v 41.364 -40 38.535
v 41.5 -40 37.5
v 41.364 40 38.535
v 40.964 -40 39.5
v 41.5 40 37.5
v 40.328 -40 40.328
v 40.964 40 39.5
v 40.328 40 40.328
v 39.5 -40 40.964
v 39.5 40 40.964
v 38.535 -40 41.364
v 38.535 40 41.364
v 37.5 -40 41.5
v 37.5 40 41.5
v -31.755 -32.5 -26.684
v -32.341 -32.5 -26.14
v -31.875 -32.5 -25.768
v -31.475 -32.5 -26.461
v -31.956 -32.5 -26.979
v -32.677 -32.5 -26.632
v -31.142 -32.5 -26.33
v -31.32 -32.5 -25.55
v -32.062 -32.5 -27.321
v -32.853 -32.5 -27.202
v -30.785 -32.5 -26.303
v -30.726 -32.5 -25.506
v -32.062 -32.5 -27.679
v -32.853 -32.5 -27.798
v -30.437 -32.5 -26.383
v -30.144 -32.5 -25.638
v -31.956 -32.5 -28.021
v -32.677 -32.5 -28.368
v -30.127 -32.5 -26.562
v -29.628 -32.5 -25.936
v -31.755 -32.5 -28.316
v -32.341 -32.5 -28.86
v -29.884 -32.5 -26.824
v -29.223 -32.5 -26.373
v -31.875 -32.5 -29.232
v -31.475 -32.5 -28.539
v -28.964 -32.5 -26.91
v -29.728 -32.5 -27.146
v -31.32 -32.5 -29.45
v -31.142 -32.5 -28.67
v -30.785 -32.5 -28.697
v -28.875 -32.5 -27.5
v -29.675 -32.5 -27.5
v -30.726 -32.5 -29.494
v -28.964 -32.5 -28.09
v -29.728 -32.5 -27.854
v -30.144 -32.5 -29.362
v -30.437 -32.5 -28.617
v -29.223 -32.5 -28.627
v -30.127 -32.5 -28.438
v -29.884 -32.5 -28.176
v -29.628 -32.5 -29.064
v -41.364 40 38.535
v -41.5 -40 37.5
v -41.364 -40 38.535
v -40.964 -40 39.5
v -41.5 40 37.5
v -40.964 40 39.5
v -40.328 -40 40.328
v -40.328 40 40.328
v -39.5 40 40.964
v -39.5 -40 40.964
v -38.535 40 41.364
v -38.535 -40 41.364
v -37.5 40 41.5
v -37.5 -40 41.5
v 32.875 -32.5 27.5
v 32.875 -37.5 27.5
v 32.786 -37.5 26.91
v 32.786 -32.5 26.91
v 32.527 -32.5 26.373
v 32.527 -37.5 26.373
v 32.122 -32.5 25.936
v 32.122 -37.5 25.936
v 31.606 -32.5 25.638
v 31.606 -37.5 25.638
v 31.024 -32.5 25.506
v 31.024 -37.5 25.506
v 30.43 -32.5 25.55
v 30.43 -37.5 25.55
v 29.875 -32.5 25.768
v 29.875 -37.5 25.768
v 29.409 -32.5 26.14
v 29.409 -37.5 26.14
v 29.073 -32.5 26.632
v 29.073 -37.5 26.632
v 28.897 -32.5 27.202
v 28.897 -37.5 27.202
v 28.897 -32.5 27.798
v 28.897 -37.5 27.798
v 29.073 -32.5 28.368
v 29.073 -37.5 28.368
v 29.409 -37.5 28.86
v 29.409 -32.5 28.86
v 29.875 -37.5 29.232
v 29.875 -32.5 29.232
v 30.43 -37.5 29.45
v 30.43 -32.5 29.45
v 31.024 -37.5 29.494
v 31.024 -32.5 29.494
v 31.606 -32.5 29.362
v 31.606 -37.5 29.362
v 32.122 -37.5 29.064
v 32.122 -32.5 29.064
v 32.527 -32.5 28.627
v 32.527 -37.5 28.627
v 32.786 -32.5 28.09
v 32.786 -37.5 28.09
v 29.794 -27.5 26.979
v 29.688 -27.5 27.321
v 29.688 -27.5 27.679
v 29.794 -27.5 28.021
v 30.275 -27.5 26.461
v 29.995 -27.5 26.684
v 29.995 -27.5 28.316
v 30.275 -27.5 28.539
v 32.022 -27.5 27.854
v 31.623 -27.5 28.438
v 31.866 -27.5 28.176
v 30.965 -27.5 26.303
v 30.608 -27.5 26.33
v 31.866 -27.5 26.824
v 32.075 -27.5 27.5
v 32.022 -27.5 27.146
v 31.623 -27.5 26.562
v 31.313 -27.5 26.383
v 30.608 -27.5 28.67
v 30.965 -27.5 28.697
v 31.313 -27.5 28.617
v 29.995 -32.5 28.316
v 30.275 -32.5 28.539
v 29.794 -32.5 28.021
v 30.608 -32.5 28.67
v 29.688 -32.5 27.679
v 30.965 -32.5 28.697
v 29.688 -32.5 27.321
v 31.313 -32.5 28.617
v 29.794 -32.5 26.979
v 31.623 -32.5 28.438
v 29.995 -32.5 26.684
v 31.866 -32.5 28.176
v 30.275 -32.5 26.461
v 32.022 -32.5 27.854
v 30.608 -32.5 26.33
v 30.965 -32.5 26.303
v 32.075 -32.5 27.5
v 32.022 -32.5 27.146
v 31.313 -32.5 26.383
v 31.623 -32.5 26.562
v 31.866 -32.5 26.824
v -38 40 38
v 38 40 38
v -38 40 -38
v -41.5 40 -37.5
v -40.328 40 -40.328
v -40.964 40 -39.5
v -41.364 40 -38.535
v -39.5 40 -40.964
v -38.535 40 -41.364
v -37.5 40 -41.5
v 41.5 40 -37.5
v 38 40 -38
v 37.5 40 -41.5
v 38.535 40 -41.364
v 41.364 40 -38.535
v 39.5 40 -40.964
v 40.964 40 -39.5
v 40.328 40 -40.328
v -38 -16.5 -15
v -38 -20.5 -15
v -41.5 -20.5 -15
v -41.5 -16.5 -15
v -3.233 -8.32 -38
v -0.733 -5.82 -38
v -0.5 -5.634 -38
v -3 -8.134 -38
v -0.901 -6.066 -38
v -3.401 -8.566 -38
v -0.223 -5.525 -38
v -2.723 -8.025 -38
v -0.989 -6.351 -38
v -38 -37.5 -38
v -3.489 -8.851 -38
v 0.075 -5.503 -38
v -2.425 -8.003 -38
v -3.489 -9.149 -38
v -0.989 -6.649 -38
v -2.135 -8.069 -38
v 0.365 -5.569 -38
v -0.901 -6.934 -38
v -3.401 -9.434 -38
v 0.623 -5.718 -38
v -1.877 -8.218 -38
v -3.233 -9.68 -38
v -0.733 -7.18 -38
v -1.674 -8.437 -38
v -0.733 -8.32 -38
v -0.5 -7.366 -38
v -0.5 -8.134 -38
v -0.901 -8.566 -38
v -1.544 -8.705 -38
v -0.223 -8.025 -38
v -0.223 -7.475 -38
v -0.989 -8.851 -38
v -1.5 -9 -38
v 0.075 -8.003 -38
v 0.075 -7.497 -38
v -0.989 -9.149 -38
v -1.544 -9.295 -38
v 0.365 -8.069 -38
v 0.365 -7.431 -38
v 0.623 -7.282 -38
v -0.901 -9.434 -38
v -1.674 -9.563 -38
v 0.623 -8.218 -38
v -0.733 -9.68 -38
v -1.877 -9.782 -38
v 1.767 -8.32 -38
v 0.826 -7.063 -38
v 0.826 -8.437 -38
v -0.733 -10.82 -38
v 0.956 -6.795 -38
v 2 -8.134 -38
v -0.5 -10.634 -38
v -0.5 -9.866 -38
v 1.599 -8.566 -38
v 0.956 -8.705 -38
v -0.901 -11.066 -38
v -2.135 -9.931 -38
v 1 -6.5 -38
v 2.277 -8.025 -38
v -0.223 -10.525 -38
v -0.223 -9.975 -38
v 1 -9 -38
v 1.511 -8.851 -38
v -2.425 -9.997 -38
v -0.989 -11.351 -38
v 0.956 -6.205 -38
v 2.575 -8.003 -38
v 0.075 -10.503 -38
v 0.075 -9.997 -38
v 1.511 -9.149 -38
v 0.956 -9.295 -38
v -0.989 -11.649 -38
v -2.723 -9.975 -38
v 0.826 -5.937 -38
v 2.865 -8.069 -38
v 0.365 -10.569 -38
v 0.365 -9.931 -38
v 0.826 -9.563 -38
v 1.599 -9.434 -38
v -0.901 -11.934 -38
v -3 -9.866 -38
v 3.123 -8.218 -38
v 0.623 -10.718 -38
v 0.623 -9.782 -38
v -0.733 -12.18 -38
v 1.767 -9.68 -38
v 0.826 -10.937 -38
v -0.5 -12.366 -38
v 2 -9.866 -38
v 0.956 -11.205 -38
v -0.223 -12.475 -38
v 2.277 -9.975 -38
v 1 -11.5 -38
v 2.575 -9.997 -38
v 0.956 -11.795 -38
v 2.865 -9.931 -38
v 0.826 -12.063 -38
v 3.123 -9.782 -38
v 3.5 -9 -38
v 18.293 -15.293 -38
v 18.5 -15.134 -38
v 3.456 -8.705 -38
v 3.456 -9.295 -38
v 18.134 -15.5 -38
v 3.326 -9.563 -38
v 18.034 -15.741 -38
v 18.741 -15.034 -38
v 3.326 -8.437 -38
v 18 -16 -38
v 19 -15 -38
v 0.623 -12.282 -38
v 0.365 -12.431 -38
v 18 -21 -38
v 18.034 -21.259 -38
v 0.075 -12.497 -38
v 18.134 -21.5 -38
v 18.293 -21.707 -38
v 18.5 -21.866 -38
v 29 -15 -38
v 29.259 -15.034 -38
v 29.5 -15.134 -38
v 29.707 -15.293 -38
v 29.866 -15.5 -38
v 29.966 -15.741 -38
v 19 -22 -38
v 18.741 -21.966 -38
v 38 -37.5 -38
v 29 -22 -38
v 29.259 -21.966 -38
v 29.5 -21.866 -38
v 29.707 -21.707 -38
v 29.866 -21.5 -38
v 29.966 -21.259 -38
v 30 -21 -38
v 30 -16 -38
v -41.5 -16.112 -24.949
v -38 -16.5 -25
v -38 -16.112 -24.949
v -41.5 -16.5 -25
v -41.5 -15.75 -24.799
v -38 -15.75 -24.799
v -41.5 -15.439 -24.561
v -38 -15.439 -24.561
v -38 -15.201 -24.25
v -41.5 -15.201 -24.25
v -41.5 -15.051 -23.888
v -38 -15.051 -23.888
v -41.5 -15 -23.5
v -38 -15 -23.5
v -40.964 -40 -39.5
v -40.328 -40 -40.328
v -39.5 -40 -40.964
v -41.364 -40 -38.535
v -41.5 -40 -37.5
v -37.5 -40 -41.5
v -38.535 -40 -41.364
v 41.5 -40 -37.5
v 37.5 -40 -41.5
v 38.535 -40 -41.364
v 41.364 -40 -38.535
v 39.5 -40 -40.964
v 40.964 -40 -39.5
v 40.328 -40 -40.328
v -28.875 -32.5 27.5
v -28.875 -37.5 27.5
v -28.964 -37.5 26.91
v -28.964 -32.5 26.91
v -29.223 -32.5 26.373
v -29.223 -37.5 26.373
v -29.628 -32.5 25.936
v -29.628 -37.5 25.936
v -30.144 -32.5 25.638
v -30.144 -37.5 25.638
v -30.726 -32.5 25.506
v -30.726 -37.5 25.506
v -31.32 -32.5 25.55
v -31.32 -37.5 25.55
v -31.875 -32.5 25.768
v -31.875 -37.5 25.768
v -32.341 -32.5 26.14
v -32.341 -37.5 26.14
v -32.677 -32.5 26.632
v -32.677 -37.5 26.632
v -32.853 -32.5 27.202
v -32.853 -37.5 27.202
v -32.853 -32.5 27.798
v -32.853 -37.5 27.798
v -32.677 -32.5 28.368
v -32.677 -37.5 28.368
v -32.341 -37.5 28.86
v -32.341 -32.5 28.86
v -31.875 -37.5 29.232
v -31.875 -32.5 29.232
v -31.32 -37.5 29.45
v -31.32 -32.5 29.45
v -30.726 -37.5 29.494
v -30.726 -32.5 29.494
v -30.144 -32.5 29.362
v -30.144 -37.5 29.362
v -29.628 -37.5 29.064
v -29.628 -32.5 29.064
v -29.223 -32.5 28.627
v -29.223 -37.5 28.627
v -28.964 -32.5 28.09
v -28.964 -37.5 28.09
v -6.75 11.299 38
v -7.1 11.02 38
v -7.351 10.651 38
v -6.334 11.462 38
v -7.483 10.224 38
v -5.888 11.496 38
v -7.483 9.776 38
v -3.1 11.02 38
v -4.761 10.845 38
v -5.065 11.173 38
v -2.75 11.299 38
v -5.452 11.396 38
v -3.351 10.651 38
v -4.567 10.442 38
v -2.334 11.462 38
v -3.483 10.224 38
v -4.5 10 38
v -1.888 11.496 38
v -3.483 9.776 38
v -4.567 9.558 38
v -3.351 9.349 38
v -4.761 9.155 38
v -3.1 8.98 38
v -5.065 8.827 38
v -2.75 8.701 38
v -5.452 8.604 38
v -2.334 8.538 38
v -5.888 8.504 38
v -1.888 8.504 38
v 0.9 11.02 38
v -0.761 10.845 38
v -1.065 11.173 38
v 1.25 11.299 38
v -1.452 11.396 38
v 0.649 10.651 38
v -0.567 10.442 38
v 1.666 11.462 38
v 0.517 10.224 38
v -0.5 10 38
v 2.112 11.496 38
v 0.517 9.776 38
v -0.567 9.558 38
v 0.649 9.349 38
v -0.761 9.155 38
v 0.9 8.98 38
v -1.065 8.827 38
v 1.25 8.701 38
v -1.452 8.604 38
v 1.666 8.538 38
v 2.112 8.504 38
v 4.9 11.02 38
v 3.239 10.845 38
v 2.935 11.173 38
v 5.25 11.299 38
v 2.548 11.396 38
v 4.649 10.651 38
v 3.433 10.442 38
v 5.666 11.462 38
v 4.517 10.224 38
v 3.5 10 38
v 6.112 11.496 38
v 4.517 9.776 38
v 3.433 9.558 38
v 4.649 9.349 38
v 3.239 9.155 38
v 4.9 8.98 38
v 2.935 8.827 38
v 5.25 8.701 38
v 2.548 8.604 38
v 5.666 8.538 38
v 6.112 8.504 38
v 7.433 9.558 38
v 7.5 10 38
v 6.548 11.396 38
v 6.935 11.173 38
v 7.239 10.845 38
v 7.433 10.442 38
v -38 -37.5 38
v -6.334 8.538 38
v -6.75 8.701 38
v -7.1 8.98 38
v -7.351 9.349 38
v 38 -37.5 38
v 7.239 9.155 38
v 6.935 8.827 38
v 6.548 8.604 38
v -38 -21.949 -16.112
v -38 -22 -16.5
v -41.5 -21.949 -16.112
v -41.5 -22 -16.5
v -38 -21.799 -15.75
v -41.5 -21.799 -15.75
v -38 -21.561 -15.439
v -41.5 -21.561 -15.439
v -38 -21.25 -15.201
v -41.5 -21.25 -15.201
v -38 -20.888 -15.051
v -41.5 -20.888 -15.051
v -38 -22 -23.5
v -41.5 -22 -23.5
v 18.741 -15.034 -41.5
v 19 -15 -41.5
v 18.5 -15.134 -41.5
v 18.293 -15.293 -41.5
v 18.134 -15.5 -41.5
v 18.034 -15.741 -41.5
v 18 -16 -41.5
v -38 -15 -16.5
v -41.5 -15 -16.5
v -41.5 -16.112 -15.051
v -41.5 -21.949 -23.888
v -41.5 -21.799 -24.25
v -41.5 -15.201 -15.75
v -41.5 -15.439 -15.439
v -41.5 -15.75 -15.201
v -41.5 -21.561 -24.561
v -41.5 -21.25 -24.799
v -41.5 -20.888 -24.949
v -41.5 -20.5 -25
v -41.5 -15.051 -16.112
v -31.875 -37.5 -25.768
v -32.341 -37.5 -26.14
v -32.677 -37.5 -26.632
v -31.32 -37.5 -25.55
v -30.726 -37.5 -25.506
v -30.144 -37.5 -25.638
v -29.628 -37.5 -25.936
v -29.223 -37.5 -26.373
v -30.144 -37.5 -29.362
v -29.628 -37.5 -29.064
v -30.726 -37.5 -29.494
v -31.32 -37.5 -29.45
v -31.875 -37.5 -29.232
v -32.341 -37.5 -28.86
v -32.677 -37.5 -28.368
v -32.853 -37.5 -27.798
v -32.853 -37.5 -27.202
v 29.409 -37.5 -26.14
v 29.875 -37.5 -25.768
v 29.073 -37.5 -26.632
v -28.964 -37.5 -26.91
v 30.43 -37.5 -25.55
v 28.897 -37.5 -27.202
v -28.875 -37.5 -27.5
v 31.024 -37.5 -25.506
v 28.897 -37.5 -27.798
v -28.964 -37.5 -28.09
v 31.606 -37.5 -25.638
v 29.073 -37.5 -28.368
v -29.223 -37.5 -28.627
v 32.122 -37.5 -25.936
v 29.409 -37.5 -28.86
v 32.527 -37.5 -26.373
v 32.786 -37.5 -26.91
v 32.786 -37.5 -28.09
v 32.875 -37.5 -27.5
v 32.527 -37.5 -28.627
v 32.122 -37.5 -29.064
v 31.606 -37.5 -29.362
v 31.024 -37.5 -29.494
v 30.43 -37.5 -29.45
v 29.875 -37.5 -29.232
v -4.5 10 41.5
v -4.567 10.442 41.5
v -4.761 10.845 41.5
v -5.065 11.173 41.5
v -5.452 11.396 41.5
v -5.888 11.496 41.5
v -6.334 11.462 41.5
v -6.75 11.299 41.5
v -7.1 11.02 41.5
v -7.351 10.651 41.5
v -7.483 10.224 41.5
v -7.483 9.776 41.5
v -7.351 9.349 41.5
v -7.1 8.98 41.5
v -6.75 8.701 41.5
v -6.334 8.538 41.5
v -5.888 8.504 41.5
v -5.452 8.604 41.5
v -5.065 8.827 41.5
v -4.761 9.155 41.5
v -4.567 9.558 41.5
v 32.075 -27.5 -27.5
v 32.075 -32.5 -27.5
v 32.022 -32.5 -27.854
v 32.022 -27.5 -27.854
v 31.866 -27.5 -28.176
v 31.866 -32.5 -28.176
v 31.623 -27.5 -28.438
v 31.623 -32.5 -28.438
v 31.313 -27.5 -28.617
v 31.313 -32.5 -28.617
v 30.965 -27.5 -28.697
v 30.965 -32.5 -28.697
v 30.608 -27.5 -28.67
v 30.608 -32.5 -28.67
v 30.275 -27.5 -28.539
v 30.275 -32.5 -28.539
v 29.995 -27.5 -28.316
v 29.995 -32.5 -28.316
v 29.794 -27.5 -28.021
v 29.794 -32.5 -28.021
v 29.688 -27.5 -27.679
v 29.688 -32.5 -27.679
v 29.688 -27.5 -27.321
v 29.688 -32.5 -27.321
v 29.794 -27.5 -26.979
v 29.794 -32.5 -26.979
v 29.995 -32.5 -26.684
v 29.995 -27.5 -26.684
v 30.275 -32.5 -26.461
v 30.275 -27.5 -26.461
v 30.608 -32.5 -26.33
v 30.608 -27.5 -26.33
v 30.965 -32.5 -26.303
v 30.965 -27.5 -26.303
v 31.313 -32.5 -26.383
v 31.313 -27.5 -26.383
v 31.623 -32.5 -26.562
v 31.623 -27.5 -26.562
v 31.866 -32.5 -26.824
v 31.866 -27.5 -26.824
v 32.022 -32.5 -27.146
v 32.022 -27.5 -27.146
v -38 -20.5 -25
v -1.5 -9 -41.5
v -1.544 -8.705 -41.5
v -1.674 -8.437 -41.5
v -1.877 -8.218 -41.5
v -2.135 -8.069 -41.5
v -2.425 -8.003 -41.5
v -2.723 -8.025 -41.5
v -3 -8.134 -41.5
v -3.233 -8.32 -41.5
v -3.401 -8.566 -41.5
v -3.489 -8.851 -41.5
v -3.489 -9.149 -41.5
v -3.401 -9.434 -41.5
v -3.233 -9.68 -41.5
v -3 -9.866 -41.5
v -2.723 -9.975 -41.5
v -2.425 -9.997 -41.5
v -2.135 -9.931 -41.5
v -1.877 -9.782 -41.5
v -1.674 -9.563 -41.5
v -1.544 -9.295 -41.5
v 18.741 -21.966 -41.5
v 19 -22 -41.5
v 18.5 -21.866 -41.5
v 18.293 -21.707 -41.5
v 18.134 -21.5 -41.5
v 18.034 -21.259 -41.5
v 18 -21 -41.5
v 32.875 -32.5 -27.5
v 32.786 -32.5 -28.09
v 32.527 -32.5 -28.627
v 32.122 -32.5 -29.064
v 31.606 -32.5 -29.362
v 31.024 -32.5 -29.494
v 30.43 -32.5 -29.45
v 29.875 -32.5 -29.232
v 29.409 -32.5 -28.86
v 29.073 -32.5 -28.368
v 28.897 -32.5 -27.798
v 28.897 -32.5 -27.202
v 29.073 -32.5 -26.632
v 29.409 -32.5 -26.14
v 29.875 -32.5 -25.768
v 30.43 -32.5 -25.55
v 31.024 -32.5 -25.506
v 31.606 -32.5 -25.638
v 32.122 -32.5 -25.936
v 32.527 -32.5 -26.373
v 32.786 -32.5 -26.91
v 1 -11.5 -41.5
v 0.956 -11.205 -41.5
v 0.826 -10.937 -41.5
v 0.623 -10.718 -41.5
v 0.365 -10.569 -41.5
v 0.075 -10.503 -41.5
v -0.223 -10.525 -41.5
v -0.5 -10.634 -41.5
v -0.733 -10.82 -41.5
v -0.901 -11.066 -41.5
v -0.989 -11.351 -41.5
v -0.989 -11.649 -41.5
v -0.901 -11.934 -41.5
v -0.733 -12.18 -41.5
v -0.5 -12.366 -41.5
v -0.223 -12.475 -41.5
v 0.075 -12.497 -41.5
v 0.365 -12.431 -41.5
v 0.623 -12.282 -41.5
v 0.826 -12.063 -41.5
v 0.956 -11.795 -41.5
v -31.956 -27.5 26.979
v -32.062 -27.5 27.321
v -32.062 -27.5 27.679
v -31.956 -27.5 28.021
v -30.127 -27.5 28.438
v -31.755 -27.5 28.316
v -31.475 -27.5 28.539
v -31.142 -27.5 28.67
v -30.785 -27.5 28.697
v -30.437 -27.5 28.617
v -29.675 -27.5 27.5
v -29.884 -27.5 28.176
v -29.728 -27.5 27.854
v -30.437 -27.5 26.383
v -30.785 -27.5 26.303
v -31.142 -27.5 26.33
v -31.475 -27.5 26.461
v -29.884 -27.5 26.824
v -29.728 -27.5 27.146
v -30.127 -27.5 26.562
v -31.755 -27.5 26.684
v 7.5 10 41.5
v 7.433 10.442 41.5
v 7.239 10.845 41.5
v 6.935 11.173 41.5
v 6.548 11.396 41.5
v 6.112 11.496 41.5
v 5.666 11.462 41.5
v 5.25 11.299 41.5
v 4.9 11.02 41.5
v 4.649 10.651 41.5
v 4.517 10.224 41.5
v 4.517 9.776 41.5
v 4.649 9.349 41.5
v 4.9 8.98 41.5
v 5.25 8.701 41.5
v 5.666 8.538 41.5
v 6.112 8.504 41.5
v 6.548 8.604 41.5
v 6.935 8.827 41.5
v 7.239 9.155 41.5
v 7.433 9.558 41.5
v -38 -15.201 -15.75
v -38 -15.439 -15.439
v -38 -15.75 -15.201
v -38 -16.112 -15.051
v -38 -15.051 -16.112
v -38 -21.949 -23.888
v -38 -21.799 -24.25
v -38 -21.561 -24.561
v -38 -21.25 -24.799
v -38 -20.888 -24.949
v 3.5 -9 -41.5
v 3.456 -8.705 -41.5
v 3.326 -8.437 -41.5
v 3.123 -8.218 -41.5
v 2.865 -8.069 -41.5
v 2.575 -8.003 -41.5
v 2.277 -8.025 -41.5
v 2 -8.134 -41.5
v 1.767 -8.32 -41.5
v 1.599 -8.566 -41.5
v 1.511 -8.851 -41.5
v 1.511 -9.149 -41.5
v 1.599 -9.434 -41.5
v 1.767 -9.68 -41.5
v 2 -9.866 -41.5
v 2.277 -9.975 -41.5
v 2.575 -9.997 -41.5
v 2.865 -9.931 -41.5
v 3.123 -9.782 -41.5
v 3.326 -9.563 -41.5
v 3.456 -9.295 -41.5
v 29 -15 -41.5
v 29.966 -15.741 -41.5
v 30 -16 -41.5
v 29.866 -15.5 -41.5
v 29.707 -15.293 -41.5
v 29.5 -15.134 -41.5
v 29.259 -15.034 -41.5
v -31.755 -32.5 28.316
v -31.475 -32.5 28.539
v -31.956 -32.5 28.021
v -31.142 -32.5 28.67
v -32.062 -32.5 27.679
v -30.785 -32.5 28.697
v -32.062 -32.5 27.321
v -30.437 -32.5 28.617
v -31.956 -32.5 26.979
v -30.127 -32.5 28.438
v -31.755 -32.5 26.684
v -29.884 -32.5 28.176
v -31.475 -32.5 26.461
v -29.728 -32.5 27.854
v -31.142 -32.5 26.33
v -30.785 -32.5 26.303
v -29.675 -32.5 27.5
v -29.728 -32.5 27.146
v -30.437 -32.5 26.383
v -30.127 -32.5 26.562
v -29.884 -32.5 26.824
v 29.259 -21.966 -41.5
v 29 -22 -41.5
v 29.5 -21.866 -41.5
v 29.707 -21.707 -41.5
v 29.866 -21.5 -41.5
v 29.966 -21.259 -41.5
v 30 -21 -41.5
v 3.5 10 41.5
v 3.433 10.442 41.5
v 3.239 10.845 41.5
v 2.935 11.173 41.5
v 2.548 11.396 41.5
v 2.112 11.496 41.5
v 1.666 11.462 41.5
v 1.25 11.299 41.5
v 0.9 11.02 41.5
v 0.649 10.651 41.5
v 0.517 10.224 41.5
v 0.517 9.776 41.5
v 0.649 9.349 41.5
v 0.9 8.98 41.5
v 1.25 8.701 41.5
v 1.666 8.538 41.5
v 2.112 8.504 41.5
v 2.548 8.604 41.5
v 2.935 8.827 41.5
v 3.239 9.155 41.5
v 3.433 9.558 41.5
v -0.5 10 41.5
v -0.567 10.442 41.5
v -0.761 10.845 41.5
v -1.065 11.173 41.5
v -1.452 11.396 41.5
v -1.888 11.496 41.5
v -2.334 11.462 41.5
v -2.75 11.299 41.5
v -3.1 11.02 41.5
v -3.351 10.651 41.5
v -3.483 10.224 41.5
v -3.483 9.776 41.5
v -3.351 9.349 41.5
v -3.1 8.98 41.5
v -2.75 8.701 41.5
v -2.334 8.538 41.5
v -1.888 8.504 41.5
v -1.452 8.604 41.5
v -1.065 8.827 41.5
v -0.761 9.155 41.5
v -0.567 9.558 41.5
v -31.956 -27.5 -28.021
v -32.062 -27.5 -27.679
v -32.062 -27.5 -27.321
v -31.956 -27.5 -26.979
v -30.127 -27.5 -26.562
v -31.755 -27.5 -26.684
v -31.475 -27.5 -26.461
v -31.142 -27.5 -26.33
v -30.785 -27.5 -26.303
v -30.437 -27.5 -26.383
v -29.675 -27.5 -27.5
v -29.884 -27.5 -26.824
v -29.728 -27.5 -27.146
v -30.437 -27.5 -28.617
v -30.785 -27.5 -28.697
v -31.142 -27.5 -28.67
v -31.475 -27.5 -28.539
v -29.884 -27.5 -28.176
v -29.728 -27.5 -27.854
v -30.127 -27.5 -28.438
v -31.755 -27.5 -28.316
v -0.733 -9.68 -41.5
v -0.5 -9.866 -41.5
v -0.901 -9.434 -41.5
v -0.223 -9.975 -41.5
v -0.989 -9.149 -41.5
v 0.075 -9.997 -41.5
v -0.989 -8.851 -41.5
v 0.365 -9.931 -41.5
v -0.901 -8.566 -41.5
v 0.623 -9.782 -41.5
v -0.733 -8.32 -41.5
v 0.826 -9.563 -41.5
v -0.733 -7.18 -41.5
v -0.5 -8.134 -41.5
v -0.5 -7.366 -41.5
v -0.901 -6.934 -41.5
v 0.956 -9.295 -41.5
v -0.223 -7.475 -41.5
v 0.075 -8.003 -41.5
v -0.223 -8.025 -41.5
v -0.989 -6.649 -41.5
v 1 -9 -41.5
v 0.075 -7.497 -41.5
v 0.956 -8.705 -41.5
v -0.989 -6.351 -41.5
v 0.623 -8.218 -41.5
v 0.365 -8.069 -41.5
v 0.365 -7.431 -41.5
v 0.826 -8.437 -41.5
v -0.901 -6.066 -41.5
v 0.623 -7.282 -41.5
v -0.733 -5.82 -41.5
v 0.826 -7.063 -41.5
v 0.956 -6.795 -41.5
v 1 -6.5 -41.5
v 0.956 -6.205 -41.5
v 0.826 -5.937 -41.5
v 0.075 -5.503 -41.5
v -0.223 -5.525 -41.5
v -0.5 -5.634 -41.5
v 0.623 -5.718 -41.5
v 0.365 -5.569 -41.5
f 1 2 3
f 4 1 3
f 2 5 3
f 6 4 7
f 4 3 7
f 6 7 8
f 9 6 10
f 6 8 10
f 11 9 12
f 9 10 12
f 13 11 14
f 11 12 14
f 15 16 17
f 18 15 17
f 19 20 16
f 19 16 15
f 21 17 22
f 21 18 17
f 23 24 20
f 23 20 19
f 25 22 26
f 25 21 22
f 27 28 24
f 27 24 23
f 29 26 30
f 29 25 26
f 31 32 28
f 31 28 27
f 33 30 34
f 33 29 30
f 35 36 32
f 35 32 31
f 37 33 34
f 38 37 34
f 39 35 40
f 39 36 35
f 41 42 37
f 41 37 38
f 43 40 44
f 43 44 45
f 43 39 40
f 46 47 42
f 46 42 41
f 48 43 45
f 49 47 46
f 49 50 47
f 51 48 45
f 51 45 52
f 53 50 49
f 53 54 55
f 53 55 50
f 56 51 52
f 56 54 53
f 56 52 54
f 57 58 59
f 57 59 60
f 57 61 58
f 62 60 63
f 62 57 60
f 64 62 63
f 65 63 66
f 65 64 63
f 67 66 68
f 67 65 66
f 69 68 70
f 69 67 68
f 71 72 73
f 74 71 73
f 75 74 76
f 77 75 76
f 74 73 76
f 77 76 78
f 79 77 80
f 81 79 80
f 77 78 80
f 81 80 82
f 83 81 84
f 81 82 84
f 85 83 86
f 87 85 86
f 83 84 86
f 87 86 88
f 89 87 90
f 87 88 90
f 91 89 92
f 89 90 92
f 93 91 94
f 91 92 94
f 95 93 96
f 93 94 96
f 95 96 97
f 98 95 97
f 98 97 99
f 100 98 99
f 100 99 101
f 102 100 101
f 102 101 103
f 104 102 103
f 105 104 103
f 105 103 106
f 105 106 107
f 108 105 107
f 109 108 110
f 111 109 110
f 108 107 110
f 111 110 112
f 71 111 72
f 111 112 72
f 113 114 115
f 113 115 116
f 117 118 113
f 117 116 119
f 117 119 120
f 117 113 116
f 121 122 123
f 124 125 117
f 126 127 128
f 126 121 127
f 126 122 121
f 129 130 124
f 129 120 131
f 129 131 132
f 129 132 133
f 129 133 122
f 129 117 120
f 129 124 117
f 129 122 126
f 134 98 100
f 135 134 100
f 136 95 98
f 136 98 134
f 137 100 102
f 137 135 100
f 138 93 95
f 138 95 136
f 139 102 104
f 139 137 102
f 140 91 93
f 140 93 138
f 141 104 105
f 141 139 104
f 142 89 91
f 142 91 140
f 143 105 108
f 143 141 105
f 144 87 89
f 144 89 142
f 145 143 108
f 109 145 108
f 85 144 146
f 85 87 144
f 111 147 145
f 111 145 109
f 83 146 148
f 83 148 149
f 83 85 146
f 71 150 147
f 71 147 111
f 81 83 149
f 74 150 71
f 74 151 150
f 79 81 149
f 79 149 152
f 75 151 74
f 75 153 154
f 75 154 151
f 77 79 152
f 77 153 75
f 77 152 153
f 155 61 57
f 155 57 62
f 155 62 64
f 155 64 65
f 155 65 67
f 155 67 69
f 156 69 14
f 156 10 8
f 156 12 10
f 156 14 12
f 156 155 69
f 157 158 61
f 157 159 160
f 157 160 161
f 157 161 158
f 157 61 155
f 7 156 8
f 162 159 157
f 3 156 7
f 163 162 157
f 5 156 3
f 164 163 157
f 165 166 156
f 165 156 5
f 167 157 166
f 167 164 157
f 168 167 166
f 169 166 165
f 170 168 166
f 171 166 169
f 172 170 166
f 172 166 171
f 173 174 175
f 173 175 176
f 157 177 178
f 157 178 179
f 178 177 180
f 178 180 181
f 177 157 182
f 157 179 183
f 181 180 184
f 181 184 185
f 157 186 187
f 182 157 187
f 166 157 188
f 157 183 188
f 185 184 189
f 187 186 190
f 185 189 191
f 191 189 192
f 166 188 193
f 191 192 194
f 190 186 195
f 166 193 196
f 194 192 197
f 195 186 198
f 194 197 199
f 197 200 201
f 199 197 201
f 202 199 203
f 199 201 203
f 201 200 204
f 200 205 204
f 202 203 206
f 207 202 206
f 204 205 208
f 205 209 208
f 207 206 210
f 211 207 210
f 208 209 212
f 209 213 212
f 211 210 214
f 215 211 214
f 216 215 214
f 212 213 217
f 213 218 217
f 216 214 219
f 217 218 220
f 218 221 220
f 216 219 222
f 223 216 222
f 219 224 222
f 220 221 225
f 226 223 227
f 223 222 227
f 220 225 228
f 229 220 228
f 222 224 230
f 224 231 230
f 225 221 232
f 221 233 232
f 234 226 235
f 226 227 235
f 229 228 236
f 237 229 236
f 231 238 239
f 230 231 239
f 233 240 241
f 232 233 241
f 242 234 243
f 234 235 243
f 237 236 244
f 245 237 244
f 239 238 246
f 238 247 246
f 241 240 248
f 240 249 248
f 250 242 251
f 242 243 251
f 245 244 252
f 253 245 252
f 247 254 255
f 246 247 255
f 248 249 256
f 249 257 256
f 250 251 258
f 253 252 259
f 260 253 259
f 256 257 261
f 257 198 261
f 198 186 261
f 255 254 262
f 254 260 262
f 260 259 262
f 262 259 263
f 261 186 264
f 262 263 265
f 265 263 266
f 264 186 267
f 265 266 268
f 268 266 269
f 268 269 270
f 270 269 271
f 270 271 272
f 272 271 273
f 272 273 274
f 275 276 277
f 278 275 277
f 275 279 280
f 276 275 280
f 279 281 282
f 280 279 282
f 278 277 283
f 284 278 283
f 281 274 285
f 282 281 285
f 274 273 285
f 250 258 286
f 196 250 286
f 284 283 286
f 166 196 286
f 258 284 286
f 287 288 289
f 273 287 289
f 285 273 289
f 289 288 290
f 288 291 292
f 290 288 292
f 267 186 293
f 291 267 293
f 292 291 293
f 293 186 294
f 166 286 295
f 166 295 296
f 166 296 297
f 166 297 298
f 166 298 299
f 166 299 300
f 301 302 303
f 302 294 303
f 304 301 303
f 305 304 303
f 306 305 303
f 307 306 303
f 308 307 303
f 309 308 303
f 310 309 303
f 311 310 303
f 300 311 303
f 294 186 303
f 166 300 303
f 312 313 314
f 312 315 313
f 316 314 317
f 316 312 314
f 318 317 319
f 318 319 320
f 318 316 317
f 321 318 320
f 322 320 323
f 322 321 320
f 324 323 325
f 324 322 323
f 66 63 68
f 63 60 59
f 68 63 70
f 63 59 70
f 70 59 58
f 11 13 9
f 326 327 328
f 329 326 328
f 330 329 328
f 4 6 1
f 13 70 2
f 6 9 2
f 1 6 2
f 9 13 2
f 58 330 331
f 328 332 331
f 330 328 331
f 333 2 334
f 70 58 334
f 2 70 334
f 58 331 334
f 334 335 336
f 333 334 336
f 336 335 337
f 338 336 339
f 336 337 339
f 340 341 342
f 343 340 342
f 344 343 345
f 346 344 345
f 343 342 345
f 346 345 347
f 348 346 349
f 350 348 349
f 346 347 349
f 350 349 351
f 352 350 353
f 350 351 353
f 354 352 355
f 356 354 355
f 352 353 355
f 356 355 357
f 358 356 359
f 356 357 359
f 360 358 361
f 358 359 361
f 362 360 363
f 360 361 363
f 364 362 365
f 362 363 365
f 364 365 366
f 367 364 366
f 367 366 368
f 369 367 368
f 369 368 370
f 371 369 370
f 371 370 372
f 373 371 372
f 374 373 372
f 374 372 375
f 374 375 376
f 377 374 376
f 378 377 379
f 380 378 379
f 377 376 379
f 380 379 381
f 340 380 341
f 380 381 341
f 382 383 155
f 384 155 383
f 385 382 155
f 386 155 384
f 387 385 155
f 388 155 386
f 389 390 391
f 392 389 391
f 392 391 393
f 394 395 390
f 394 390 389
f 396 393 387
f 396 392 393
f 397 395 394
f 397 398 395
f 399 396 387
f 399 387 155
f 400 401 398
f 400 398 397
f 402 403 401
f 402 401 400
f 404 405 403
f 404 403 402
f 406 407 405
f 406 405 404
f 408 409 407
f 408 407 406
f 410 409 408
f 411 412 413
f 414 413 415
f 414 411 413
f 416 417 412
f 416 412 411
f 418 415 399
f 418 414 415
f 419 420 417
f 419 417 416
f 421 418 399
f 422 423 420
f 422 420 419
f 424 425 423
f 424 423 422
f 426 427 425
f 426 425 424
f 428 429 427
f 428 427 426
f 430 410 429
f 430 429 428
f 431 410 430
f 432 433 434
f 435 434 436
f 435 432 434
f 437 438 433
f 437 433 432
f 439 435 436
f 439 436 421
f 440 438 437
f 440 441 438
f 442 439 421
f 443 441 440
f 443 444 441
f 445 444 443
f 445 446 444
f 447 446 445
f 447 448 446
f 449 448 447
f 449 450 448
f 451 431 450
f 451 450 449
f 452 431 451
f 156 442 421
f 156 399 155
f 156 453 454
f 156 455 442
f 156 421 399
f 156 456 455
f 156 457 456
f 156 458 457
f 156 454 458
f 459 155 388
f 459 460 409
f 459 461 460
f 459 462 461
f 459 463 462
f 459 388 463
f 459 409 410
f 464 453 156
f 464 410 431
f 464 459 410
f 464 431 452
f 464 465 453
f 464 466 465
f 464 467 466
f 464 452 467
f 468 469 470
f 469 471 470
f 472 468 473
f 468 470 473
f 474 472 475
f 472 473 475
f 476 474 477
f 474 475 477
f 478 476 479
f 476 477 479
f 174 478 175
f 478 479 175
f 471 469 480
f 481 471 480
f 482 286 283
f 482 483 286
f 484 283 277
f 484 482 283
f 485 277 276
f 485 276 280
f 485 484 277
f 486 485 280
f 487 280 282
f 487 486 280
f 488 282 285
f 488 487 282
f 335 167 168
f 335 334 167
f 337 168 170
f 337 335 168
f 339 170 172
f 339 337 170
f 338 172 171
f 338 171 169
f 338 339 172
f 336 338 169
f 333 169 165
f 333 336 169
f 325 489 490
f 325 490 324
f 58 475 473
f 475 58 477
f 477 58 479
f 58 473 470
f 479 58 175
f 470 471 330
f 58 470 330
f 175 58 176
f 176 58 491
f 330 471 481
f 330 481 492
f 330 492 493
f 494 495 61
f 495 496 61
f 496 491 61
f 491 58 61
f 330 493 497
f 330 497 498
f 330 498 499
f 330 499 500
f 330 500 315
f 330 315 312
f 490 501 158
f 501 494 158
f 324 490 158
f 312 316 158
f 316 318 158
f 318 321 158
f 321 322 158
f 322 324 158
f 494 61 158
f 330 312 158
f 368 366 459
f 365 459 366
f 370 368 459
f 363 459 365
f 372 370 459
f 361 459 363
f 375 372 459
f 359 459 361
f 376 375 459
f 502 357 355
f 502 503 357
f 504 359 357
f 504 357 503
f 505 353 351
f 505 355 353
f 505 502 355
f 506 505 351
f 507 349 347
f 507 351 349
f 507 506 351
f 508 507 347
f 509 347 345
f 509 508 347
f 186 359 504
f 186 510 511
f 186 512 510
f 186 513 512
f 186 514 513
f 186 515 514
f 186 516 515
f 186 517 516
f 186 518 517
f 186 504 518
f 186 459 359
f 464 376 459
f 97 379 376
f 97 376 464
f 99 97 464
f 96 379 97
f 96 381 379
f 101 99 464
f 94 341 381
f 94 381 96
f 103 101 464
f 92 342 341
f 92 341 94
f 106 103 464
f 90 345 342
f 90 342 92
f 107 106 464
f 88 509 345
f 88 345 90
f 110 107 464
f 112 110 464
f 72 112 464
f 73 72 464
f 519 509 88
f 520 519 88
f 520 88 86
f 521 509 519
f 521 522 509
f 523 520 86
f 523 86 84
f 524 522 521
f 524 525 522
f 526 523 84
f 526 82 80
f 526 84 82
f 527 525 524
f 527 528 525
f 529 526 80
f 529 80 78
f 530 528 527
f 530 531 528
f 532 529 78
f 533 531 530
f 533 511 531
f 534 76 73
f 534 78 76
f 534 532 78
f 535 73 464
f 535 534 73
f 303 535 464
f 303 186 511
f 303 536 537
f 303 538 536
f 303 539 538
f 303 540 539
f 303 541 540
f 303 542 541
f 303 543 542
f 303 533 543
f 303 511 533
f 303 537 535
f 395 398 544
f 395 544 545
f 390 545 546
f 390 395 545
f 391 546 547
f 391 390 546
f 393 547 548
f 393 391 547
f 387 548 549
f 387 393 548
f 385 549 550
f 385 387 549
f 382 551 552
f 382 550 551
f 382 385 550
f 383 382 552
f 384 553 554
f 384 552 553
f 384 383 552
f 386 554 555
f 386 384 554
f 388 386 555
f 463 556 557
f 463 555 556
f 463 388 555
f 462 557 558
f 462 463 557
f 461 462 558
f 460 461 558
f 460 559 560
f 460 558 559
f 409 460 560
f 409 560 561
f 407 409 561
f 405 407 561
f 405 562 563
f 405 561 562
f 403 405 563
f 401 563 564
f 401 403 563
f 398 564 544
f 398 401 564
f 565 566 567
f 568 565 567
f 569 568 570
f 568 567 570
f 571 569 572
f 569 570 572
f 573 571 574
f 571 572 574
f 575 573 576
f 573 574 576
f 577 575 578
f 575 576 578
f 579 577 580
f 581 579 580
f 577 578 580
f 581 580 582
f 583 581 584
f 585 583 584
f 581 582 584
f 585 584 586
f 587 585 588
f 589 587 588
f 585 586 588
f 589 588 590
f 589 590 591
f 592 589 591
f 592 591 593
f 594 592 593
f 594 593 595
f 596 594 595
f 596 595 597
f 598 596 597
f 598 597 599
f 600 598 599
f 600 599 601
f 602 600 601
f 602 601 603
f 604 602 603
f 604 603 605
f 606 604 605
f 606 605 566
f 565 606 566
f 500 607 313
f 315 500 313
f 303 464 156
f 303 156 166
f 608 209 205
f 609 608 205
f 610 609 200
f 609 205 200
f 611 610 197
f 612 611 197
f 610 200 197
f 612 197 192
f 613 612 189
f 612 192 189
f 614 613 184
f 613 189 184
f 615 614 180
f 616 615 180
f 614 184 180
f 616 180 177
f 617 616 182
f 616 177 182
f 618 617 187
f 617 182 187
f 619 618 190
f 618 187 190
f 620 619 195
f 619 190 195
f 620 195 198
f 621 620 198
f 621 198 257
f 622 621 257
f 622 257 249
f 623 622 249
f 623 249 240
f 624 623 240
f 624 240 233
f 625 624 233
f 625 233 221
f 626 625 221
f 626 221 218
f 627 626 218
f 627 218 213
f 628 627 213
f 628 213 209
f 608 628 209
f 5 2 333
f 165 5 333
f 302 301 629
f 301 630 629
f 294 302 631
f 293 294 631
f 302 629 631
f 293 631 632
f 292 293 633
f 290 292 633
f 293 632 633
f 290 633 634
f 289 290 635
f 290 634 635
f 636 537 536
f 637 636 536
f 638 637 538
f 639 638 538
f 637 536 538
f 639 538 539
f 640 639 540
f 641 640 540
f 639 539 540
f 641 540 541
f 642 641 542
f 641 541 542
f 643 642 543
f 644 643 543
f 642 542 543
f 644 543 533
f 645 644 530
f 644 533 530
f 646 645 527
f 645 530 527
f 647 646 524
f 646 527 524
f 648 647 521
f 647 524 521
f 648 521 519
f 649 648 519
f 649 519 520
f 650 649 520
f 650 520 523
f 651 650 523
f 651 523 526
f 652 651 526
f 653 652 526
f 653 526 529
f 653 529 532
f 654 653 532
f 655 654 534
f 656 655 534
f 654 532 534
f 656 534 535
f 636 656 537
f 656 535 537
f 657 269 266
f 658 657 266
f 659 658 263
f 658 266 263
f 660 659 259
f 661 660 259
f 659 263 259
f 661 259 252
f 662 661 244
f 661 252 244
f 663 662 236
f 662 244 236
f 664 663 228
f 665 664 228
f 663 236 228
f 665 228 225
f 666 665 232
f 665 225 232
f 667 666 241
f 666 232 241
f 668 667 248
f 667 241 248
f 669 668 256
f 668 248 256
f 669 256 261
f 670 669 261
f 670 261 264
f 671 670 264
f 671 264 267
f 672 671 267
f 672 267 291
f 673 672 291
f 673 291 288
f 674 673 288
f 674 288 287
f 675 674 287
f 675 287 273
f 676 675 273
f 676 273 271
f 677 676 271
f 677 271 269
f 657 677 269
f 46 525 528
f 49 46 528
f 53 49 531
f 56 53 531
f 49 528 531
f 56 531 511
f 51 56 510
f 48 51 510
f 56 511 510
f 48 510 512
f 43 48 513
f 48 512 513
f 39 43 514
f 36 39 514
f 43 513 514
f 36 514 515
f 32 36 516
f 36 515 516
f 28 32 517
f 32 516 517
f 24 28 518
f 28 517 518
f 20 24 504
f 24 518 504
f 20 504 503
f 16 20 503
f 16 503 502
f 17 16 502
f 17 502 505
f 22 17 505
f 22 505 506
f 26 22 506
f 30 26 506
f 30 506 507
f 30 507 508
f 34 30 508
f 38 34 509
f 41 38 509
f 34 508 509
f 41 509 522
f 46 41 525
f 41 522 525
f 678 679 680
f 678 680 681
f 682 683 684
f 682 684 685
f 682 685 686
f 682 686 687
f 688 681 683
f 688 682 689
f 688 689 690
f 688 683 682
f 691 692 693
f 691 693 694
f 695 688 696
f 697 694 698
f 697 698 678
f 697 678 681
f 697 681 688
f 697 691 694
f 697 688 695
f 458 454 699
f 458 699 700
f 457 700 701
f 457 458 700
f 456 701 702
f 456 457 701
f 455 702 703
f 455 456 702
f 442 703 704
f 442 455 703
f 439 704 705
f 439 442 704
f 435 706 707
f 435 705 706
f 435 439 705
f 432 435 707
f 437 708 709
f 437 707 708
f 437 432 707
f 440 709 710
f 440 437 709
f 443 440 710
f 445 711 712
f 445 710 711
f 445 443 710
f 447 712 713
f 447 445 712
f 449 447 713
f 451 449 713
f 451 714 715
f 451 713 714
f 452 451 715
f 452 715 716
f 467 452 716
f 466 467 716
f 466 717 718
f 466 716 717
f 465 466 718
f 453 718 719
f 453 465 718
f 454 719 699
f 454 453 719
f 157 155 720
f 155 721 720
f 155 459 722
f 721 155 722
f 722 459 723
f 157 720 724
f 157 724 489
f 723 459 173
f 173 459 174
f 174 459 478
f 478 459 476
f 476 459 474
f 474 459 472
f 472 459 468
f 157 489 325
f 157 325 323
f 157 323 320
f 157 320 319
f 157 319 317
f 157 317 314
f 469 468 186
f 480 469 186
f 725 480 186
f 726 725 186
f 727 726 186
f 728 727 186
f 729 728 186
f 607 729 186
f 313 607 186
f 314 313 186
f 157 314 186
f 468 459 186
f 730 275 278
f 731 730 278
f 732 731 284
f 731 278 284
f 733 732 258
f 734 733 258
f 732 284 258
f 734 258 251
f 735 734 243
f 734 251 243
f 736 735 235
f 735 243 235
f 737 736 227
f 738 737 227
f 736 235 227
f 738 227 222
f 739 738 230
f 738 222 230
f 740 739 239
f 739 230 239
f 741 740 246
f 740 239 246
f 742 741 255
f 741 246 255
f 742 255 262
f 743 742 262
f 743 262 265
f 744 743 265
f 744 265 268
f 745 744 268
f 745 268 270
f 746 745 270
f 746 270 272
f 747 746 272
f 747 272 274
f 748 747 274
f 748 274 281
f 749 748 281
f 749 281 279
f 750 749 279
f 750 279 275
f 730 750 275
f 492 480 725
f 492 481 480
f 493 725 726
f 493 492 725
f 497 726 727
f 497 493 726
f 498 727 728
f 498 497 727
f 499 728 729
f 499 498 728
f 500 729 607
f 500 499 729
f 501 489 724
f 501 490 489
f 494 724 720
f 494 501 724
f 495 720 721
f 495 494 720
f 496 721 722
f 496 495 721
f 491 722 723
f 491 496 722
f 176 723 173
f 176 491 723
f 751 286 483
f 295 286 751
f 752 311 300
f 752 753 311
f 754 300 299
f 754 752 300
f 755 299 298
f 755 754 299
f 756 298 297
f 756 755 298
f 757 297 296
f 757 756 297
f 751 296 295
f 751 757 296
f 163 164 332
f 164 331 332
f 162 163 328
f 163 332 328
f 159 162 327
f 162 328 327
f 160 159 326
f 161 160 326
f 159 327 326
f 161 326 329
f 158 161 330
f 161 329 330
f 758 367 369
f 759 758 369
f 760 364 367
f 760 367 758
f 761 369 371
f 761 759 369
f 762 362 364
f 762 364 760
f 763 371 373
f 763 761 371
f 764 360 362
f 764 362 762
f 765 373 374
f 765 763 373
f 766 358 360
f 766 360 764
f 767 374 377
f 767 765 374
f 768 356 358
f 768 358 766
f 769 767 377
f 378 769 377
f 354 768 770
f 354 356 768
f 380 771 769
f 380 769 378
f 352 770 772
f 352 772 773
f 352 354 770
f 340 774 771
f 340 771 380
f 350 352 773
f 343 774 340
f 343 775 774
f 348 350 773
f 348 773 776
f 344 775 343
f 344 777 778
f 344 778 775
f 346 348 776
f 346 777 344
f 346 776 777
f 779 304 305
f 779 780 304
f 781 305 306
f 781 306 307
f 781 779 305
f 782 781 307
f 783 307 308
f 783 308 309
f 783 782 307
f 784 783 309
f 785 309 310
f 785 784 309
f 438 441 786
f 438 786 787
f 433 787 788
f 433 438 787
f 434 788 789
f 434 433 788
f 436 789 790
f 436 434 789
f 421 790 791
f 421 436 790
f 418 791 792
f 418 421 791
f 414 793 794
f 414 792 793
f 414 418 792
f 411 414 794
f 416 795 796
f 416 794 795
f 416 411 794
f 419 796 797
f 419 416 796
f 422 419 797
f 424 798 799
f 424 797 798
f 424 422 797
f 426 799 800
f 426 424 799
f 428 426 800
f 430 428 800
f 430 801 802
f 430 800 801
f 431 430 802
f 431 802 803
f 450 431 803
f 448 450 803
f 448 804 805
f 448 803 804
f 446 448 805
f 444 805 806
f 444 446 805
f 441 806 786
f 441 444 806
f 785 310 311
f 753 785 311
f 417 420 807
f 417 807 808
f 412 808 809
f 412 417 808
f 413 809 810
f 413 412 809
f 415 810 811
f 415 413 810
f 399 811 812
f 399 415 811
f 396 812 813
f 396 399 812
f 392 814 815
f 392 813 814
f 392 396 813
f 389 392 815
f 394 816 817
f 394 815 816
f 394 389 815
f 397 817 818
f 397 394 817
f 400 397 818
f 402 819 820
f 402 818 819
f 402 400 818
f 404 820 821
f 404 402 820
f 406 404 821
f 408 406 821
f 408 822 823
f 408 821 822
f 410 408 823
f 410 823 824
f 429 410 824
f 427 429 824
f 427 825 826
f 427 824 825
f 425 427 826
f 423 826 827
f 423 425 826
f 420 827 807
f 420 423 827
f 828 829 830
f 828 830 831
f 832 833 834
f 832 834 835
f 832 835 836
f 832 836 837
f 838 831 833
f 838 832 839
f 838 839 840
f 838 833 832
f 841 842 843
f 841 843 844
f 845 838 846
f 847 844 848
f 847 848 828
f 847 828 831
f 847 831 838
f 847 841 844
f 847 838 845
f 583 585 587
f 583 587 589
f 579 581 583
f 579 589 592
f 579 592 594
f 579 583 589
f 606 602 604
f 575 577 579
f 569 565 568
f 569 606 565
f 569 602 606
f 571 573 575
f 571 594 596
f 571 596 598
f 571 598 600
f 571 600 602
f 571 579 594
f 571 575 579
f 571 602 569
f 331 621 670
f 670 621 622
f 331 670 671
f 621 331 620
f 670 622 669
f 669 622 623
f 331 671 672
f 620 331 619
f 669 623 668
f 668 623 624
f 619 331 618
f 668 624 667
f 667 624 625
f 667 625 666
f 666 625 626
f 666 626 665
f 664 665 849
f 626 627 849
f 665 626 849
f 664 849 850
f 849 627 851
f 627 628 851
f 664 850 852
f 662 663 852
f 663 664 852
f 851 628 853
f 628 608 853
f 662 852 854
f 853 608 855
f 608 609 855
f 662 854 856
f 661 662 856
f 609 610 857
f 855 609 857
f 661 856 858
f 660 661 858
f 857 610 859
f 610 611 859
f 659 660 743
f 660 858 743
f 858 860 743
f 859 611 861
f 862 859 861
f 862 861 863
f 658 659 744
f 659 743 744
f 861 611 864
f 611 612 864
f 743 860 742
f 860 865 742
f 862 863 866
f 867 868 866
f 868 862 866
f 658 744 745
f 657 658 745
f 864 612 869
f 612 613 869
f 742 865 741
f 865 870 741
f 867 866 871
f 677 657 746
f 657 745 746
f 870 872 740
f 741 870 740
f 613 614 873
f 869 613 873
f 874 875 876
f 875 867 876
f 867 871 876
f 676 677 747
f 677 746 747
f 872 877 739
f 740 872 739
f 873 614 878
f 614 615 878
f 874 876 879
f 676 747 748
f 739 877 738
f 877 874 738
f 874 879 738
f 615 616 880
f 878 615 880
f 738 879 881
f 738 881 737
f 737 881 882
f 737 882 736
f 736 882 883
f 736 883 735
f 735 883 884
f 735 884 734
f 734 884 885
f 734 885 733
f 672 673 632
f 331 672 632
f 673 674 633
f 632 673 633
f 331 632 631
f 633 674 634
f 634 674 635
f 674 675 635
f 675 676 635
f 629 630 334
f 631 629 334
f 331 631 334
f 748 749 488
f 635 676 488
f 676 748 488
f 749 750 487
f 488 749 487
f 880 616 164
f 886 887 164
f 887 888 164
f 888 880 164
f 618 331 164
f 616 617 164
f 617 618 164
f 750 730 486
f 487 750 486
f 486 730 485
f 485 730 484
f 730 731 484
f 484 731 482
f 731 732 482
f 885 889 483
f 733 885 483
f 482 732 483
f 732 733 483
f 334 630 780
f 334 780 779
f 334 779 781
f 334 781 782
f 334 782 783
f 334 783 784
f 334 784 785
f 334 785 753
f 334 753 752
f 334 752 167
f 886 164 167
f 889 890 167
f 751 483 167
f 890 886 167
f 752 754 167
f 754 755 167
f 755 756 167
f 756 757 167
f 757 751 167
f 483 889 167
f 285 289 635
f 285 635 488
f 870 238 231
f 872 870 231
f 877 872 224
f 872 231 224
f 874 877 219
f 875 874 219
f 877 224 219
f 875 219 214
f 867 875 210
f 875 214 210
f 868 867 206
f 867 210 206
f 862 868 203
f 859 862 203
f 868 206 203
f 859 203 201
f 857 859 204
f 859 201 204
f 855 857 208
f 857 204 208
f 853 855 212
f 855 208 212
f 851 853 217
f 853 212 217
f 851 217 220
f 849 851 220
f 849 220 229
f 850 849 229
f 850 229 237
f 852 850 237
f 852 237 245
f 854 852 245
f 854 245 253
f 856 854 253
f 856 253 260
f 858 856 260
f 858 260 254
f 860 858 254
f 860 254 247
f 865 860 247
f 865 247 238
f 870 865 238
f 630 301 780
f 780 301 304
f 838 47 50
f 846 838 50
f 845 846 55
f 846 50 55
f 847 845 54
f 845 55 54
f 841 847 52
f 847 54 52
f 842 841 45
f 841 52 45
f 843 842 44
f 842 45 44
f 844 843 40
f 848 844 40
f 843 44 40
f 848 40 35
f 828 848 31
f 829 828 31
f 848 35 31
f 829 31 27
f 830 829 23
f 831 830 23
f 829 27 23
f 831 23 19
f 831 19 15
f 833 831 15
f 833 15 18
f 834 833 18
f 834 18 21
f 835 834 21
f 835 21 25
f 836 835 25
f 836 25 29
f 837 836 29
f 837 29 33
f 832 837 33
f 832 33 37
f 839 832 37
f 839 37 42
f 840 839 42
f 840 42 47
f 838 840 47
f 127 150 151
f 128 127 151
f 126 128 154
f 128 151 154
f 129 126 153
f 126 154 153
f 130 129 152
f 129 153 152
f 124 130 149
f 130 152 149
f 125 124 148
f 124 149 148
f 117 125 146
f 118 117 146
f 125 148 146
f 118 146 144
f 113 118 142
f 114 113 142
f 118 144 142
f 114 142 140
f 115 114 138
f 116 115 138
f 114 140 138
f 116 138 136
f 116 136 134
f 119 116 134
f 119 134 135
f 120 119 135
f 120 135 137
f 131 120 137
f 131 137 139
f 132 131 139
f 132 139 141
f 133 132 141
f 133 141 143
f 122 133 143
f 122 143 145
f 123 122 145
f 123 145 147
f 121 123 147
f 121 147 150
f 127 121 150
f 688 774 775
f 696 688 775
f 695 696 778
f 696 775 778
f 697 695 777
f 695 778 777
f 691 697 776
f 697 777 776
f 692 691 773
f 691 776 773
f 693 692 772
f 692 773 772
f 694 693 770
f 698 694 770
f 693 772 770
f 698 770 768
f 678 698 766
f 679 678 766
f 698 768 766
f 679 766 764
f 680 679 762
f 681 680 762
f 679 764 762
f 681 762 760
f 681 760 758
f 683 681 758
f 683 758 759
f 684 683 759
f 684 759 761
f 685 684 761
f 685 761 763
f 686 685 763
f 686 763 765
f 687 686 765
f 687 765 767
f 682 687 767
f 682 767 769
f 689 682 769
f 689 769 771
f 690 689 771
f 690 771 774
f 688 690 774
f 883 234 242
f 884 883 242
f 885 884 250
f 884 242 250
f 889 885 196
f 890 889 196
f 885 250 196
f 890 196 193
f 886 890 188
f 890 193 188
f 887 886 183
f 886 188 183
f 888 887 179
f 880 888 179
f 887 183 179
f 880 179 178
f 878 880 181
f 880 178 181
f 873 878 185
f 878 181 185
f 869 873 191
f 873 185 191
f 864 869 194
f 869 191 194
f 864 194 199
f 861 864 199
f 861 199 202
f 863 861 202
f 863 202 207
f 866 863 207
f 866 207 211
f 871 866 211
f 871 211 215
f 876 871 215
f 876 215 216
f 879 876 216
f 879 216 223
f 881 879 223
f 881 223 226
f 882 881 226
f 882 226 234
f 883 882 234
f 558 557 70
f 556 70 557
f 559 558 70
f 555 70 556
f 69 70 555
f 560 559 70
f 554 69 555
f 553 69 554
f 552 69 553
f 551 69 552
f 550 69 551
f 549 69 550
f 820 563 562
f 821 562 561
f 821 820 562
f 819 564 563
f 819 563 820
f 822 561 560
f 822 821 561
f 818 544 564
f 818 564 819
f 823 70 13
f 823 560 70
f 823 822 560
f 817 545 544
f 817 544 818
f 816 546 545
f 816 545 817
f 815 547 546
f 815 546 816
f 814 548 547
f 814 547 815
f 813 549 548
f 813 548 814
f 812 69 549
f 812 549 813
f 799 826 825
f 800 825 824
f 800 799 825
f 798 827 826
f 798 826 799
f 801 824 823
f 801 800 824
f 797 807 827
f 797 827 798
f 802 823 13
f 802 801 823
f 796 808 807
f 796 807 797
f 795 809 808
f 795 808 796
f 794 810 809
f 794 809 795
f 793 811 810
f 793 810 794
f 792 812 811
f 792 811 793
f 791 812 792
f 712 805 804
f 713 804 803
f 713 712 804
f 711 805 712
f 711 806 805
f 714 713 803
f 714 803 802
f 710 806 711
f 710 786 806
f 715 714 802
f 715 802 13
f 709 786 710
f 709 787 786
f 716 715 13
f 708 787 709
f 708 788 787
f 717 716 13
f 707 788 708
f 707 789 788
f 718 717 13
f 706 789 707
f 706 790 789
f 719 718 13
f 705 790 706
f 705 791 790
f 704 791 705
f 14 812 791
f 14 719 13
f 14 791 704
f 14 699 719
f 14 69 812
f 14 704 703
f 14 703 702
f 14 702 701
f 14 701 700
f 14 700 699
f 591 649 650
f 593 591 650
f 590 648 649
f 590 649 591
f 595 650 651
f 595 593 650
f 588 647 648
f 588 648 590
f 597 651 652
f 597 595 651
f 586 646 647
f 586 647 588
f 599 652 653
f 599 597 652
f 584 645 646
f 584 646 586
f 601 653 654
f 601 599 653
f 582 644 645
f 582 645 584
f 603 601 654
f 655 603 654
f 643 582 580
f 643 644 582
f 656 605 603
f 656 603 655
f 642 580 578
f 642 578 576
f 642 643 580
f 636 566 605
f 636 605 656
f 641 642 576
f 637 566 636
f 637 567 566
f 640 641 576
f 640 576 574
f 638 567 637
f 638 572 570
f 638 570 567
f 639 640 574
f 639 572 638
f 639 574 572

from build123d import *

# Parameters (mm, degrees)
BOSS_EXTRUDE2_DEPTH      = 40
BOSS_EXTRUDE2_DEPTH_BACK = 40
SKETCH4_W                = 83
SKETCH4_H                = 83
CUT_EXTRUDE1_DEPTH       = 50
CUT_EXTRUDE1_DEPTH_BACK  = 37.5
SKETCH5_W                = 76
SKETCH5_H                = 76
CUT_EXTRUDE2_DEPTH       = 74.5
CUT_EXTRUDE2_DEPTH_BACK  = 5
SKETCH6_R                = 1.5
SKETCH8_R                = 1
CUT_EXTRUDE3_DEPTH       = 70.5
SKETCH9_W                = 12
SKETCH9_H                = 7
CUT_EXTRUDE4_DEPTH       = 108.5
FILLET2_R                = 1
FILLET3_R                = 4
SKETCH10_W               = 10
SKETCH10_H               = 7
CUT_EXTRUDE5_DEPTH       = 83
FILLET4_R                = 1.5
SKETCH11_R               = 2
BOSS_EXTRUDE4_DEPTH      = 5
SKETCH12_R               = 1.2
BOSS_EXTRUDE5_DEPTH      = 10


with BuildPart() as part:
    # Sketch4 → Boss-Extrude2 (new, two sides: drawn at the far end of the back side and taken through both)
    with BuildSketch(Plane(origin=(0, 0, 0), x_dir=(1, 0, 0), z_dir=(0, 1, 0)).offset(-BOSS_EXTRUDE2_DEPTH_BACK)):
        Rectangle(SKETCH4_W, SKETCH4_H)
    extrude(amount=BOSS_EXTRUDE2_DEPTH + BOSS_EXTRUDE2_DEPTH_BACK)

    # Sketch5 → Cut-Extrude1 (cut, two sides: drawn at the far end of the back side and taken through both)
    with BuildSketch(Plane(origin=(0, 0, 0), x_dir=(1, 0, 0), z_dir=(0, 1, 0)).offset(-CUT_EXTRUDE1_DEPTH_BACK)):
        Rectangle(SKETCH5_W, SKETCH5_H)
    extrude(amount=CUT_EXTRUDE1_DEPTH + CUT_EXTRUDE1_DEPTH_BACK, mode=Mode.SUBTRACT)

    # Sketch6 → Cut-Extrude2 (cut, two sides: drawn at the far end of the back side and taken through both)
    with BuildSketch(Plane.XY.offset(-CUT_EXTRUDE2_DEPTH_BACK)):
        with Locations((2, 10)):
            Circle(SKETCH6_R)
        with Locations((6, 10)):
            Circle(SKETCH6_R)
        with Locations((-2, 10)):
            Circle(SKETCH6_R)
        with Locations((-6, 10)):
            Circle(SKETCH6_R)
    extrude(amount=CUT_EXTRUDE2_DEPTH + CUT_EXTRUDE2_DEPTH_BACK, mode=Mode.SUBTRACT)

    # Sketch8 → Cut-Extrude3 (cut)
    with BuildSketch(Plane.XY):
        with Locations((0, -9)):
            Circle(SKETCH8_R)
        with Locations((2.5, -9)):
            Circle(SKETCH8_R)
        with Locations((0, -6.5)):
            Circle(SKETCH8_R)
        with Locations((-2.5, -9)):
            Circle(SKETCH8_R)
        with Locations((0, -11.5)):
            Circle(SKETCH8_R)
    extrude(amount=-CUT_EXTRUDE3_DEPTH, mode=Mode.SUBTRACT)

    # Sketch9 → Cut-Extrude4 (cut)
    with BuildSketch(Plane.XY):
        with Locations((24, -18.5)):
            Rectangle(SKETCH9_W, SKETCH9_H)
    extrude(amount=-CUT_EXTRUDE4_DEPTH, mode=Mode.SUBTRACT)

    # Fillet2
    fillet2_edges = [part.edges().sort_by_distance(p)[0] for p in [
        (18, -22, -39.75),
        (30, -22, -39.75),
        (18, -15, -39.75),
        (30, -15, -39.75),
    ]]
    fillet(fillet2_edges, radius=FILLET2_R)

    # Fillet3
    fillet3_edges = [part.edges().sort_by_distance(p)[0] for p in [
        (-41.5, 0, 41.5),
        (41.5, 0, -41.5),
        (41.5, 0, 41.5),
        (-41.5, 0, -41.5),
    ]]
    fillet(fillet3_edges, radius=FILLET3_R)

    # Sketch10 → Cut-Extrude5 (cut)
    with BuildSketch(Plane(origin=(0, 0, 0), x_dir=(0, 0, -1), z_dir=(1, 0, 0))):
        with Locations((20, -18.5)):
            Rectangle(SKETCH10_W, SKETCH10_H)
    extrude(amount=-CUT_EXTRUDE5_DEPTH, mode=Mode.SUBTRACT)

    # Fillet4
    fillet4_edges = [part.edges().sort_by_distance(p)[0] for p in [
        (-39.75, -22, -15),
        (-39.75, -22, -25),
        (-39.75, -15, -15),
        (-39.75, -15, -25),
    ]]
    fillet(fillet4_edges, radius=FILLET4_R)

    # Sketch11 → Boss-Extrude4 (add)
    with BuildSketch(Plane(origin=(0, -37.5, 0), x_dir=(1, 0, 0), z_dir=(0, 1, 0))):
        with Locations((30.875, 27.5)):
            Circle(SKETCH11_R)
        with Locations((-30.875, 27.5)):
            Circle(SKETCH11_R)
        with Locations((-30.875, -27.5)):
            Circle(SKETCH11_R)
        with Locations((30.875, -27.5)):
            Circle(SKETCH11_R)
    extrude(amount=BOSS_EXTRUDE4_DEPTH)

    # Sketch12 → Boss-Extrude5 (add)
    with BuildSketch(Plane(origin=(0, -37.5, 0), x_dir=(1, 0, 0), z_dir=(0, 1, 0))):
        with Locations((-30.875, 27.5)):
            Circle(SKETCH12_R)
        with Locations((30.875, 27.5)):
            Circle(SKETCH12_R)
        with Locations((-30.875, -27.5)):
            Circle(SKETCH12_R)
        with Locations((30.875, -27.5)):
            Circle(SKETCH12_R)
    extrude(amount=BOSS_EXTRUDE5_DEPTH)


solid = part.part
